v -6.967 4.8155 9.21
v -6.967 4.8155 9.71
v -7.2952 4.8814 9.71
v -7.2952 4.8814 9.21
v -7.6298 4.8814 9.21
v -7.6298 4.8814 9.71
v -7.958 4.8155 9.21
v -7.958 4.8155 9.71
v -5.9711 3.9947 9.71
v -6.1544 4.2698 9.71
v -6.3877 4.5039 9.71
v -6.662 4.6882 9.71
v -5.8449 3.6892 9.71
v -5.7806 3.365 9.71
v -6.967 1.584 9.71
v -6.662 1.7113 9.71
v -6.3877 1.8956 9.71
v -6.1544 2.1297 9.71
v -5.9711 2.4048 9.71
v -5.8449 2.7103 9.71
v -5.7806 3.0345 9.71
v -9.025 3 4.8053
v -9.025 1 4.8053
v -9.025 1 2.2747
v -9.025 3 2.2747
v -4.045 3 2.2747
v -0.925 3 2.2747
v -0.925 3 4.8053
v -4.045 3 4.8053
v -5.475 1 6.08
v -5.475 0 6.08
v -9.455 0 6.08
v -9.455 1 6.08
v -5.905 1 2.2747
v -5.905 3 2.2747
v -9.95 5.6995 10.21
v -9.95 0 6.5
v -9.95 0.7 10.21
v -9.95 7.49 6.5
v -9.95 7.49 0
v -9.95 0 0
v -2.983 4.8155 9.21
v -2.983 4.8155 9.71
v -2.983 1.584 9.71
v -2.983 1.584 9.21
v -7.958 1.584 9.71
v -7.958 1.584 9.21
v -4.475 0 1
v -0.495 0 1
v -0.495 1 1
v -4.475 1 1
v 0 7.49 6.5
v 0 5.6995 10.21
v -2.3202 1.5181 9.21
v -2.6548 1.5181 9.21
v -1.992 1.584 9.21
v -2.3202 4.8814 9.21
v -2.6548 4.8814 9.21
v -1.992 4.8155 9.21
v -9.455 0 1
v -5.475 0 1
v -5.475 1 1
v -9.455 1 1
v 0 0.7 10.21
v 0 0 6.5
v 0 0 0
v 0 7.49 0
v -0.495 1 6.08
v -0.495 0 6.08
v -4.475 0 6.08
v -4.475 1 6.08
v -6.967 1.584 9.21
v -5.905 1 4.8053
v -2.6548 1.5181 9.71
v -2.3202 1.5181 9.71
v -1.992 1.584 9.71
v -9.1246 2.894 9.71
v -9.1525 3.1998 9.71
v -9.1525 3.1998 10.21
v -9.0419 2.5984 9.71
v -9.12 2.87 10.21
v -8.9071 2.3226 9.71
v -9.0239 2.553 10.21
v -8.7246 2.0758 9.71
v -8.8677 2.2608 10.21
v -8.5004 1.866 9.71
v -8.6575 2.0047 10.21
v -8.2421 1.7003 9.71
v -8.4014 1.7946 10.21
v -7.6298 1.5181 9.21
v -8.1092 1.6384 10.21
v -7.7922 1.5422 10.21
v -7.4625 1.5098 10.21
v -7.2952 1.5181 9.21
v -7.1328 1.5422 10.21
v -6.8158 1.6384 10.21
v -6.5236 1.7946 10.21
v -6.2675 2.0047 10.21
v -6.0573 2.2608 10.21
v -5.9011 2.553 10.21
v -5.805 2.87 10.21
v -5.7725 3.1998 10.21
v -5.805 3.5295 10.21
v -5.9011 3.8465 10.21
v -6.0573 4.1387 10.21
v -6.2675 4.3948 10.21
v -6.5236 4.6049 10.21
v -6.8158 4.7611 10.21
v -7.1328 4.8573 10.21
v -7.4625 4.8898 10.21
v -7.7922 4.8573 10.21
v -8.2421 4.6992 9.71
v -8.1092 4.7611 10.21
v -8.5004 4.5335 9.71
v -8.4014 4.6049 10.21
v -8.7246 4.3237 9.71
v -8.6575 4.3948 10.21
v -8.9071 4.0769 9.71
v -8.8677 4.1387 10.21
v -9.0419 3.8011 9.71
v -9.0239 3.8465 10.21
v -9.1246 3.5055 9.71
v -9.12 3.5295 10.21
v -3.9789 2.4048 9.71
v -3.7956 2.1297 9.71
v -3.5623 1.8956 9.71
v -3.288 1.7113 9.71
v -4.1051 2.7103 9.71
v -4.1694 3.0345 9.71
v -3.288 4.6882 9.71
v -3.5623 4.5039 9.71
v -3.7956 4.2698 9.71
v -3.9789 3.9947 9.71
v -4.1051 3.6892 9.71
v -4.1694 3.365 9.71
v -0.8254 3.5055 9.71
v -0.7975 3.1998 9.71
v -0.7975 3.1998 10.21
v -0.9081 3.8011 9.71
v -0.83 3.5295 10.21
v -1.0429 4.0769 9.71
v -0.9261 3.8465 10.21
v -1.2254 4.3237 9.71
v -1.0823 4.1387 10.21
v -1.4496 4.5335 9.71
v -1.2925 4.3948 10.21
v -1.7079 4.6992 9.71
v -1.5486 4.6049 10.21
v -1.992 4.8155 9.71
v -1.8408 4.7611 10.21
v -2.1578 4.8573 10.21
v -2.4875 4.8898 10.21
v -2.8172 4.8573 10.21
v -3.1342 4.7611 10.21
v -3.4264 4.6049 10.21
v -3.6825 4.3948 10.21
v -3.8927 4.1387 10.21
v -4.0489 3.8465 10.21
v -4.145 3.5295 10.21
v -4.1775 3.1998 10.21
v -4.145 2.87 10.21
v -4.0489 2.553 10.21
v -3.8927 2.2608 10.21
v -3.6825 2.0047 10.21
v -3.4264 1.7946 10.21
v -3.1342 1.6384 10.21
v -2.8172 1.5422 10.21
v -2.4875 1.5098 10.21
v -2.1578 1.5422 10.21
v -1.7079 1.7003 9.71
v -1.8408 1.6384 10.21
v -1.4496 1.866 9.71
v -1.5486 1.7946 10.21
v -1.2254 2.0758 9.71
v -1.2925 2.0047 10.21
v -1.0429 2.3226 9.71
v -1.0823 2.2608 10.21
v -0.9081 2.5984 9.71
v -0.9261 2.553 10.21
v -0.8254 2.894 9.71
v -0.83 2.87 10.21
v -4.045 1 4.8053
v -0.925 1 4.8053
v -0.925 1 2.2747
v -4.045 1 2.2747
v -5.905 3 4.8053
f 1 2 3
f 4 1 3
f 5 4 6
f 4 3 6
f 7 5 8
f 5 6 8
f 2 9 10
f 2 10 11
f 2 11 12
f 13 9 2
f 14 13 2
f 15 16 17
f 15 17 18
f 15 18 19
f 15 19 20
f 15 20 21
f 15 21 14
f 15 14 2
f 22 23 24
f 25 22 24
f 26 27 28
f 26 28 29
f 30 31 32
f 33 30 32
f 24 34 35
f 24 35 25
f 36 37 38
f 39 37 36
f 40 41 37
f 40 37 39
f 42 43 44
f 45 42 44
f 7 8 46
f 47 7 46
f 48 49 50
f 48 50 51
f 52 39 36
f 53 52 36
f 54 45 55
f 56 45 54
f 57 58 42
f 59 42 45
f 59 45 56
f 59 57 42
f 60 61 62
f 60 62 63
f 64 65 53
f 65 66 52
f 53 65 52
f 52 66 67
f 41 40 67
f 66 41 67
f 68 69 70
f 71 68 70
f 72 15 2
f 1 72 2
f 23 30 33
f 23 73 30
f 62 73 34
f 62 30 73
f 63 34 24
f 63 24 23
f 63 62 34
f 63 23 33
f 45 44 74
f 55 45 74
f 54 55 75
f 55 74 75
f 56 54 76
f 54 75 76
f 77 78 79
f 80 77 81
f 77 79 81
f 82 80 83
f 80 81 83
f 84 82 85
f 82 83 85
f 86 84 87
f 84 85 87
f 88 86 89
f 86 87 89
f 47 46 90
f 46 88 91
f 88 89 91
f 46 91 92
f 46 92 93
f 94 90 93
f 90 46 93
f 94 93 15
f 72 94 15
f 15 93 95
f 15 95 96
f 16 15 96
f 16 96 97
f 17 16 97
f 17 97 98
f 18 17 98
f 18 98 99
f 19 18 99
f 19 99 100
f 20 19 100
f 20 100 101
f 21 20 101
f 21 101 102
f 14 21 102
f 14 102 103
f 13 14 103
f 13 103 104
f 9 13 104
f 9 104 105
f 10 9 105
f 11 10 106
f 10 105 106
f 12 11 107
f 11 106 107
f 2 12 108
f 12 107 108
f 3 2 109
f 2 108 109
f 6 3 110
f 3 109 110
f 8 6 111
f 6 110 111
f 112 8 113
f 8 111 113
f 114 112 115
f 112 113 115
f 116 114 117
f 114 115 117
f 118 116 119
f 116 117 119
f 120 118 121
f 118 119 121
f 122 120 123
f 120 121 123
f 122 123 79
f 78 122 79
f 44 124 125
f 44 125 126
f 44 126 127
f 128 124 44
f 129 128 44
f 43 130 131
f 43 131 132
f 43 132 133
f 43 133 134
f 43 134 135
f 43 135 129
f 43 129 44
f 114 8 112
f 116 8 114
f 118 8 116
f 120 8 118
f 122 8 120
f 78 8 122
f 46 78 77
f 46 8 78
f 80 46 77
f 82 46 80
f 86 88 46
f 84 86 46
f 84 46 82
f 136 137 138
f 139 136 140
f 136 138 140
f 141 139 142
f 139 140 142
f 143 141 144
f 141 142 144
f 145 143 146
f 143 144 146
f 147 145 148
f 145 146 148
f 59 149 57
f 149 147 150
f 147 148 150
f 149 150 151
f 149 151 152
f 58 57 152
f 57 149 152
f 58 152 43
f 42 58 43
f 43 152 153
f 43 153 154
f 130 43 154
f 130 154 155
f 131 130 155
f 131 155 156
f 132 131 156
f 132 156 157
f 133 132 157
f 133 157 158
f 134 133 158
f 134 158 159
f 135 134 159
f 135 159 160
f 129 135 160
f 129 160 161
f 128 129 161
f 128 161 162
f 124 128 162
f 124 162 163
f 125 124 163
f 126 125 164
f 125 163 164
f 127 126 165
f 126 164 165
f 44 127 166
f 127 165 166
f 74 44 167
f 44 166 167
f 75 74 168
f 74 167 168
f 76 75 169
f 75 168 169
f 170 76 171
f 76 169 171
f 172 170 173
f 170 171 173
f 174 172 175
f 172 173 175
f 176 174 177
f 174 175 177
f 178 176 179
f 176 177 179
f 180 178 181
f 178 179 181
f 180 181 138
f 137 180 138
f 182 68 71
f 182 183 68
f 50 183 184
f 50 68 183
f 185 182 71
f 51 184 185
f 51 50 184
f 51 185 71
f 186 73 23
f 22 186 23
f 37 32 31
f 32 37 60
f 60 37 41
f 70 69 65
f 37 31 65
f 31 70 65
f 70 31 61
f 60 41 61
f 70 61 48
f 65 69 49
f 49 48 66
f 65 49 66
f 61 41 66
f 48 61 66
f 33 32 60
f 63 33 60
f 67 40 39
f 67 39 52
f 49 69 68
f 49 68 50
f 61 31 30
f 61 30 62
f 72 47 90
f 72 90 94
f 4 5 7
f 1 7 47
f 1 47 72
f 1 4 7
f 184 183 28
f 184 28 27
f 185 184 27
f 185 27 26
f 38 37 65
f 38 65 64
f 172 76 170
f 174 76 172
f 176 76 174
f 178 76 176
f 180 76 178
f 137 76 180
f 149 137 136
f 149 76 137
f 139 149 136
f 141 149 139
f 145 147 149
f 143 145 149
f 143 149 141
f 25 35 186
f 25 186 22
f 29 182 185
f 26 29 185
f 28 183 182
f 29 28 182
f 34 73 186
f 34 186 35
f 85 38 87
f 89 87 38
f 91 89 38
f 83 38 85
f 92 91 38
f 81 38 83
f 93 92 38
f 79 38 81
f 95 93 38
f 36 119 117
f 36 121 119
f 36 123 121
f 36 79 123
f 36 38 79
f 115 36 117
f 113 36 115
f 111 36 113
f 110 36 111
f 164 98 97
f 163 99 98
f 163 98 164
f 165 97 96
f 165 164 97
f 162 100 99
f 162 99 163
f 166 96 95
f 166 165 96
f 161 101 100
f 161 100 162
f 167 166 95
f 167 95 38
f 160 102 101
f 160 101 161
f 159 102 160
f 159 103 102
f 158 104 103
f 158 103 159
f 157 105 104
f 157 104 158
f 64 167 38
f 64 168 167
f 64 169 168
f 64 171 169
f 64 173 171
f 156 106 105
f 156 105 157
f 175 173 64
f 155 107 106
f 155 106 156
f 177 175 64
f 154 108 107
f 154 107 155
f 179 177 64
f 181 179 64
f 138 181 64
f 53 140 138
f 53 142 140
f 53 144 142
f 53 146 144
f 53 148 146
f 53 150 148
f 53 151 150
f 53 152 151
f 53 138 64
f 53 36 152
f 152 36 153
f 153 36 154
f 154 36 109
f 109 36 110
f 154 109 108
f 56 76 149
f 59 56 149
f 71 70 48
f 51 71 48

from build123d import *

# Parameters (mm, degrees)
CROQUIS1_W              = 9.95
CROQUIS1_H              = 7.49
SALIENTE_EXTRUIR1_DEPTH = 10.21
CORTAR_EXTRUIR1_DEPTH   = 17.104244782
CROQUIS3_W              = 3.98
CROQUIS3_H              = 5.08
CORTAR_EXTRUIR3_DEPTH   = 1
CROQUIS4_R              = 1.69
CORTAR_EXTRUIR4_DEPTH   = 0.5
CORTAR_EXTRUIR6_DEPTH   = 0.5
CROQUIS7_W              = 3.119915204
CROQUIS7_H              = 2.530639344
CORTAR_EXTRUIR7_DEPTH   = 2


with BuildPart() as part:
    # Croquis1 → Saliente-Extruir1 (new body)
    with BuildSketch(Plane.XY):
        with Locations((-4.975, 3.745)):
            Rectangle(CROQUIS1_W, CROQUIS1_H)
    extrude(amount=SALIENTE_EXTRUIR1_DEPTH)

    # Croquis2 → Cortar-Extruir1 (cut, through all)
    with BuildSketch(Plane.ZY.offset(9.95)):
        Polygon((10.21, 5.699503954), (10.21, 7.49), (6.5, 7.49), align=None)
        Polygon((10.21, 0.7), (10.21, 0), (6.5, 0), align=None)
    extrude(amount=-CORTAR_EXTRUIR1_DEPTH, mode=Mode.SUBTRACT)

    # Croquis3 → Cortar-Extruir3 (cut)
    with BuildSketch(Plane(origin=(0, 0, 0), x_dir=(-1, 0, 0), z_dir=(0, -1, 0))):
        with Locations((2.485, -3.54)):
            Rectangle(CROQUIS3_W, CROQUIS3_H)
        with Locations((7.465, -3.54)):
            Rectangle(CROQUIS3_W, CROQUIS3_H)
    extrude(amount=-CORTAR_EXTRUIR3_DEPTH, mode=Mode.SUBTRACT)

    # Croquis4 → Cortar-Extruir4 (cut)
    with BuildSketch(Plane.XY.offset(10.21)):
        with Locations((-2.4875, 3.199751977)):
            Circle(CROQUIS4_R)
        with Locations(Location((-7.4625, 3.199751977, 0), (0, 0, 180))):
            Circle(CROQUIS4_R)
    extrude(amount=-CORTAR_EXTRUIR4_DEPTH, mode=Mode.SUBTRACT)

    # Croquis6 → Cortar-Extruir6 (cut)
    with BuildSketch(Plane.XY.offset(9.71)):
        with BuildLine():
            Line((-6.96704565, 1.584009118), (-6.96704565, 4.815494836))
            ThreePointArc((-6.96704565, 4.815494836), (-7.4625, 4.889751977), (-7.95795435, 4.815494836))
            Line((-7.95795435, 4.815494836), (-7.95795435, 1.584009118))
            ThreePointArc((-7.95795435, 1.584009118), (-7.4625, 1.509751977), (-6.96704565, 1.584009118))
        make_face()
        with BuildLine():
            Line((-1.99204565, 1.584009118), (-1.99204565, 4.815494836))
            ThreePointArc((-1.99204565, 4.815494836), (-2.4875, 4.889751977), (-2.98295435, 4.815494836))
            Line((-2.98295435, 4.815494836), (-2.98295435, 1.584009118))
            ThreePointArc((-2.98295435, 1.584009118), (-2.4875, 1.509751977), (-1.99204565, 1.584009118))
        make_face()
    extrude(amount=-CORTAR_EXTRUIR6_DEPTH, mode=Mode.SUBTRACT)

    # Croquis7 → Cortar-Extruir7 (cut)
    with BuildSketch(Plane(origin=(0, 1, 0), x_dir=(-1, 0, 0), z_dir=(0, -1, 0))):
        with Locations((7.465, -3.54)):
            Rectangle(CROQUIS7_W, CROQUIS7_H)
        with Locations((2.485, -3.54)):
            Rectangle(CROQUIS7_W, CROQUIS7_H)
    extrude(amount=-CORTAR_EXTRUIR7_DEPTH, mode=Mode.SUBTRACT)


solid = part.part
